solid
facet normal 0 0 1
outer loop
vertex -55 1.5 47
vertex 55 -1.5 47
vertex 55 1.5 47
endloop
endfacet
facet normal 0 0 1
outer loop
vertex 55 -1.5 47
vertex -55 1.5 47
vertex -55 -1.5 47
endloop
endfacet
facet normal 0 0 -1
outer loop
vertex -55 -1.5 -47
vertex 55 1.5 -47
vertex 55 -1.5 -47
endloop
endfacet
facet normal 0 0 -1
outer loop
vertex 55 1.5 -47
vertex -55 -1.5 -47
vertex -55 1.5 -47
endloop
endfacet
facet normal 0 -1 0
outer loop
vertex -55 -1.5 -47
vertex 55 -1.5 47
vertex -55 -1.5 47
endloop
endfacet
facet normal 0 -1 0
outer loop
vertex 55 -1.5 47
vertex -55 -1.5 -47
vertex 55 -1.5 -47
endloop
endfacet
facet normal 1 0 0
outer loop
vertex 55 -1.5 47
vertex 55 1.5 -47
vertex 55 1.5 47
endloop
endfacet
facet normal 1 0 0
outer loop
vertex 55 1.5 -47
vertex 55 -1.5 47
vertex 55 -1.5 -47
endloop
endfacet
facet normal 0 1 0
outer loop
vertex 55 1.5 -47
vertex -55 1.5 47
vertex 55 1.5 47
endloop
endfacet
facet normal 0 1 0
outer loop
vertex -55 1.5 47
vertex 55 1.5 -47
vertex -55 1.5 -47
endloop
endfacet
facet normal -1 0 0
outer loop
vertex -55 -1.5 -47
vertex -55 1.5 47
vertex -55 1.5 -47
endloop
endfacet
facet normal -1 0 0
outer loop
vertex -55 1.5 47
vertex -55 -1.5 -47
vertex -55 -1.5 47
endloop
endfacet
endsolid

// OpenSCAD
// file: measures.scad
/**
 * Pencil box configuration
 * All measures in millimeters
 */

$fn = 200;

material_z = 3;

box_x = 130;
box_y = 70;
box_z = 100;

curvature_diameter = box_y;
curvature_width = 20;

rect_x = box_x - curvature_width;
rect_y = box_y;

wall_z = box_z - 2*material_z;
wall_inset = material_z;

hole_inset = 4*material_z;

nothing = 0.005;

pillar_count = 20;
pillar_angle = 180 / (pillar_count-1);
pillar_width = 4;
// main file
include <measures.scad>;

module face_side()
{
    cube([
        rect_x,
        material_z,
        wall_z
        ], center=true);
}

face_side();
